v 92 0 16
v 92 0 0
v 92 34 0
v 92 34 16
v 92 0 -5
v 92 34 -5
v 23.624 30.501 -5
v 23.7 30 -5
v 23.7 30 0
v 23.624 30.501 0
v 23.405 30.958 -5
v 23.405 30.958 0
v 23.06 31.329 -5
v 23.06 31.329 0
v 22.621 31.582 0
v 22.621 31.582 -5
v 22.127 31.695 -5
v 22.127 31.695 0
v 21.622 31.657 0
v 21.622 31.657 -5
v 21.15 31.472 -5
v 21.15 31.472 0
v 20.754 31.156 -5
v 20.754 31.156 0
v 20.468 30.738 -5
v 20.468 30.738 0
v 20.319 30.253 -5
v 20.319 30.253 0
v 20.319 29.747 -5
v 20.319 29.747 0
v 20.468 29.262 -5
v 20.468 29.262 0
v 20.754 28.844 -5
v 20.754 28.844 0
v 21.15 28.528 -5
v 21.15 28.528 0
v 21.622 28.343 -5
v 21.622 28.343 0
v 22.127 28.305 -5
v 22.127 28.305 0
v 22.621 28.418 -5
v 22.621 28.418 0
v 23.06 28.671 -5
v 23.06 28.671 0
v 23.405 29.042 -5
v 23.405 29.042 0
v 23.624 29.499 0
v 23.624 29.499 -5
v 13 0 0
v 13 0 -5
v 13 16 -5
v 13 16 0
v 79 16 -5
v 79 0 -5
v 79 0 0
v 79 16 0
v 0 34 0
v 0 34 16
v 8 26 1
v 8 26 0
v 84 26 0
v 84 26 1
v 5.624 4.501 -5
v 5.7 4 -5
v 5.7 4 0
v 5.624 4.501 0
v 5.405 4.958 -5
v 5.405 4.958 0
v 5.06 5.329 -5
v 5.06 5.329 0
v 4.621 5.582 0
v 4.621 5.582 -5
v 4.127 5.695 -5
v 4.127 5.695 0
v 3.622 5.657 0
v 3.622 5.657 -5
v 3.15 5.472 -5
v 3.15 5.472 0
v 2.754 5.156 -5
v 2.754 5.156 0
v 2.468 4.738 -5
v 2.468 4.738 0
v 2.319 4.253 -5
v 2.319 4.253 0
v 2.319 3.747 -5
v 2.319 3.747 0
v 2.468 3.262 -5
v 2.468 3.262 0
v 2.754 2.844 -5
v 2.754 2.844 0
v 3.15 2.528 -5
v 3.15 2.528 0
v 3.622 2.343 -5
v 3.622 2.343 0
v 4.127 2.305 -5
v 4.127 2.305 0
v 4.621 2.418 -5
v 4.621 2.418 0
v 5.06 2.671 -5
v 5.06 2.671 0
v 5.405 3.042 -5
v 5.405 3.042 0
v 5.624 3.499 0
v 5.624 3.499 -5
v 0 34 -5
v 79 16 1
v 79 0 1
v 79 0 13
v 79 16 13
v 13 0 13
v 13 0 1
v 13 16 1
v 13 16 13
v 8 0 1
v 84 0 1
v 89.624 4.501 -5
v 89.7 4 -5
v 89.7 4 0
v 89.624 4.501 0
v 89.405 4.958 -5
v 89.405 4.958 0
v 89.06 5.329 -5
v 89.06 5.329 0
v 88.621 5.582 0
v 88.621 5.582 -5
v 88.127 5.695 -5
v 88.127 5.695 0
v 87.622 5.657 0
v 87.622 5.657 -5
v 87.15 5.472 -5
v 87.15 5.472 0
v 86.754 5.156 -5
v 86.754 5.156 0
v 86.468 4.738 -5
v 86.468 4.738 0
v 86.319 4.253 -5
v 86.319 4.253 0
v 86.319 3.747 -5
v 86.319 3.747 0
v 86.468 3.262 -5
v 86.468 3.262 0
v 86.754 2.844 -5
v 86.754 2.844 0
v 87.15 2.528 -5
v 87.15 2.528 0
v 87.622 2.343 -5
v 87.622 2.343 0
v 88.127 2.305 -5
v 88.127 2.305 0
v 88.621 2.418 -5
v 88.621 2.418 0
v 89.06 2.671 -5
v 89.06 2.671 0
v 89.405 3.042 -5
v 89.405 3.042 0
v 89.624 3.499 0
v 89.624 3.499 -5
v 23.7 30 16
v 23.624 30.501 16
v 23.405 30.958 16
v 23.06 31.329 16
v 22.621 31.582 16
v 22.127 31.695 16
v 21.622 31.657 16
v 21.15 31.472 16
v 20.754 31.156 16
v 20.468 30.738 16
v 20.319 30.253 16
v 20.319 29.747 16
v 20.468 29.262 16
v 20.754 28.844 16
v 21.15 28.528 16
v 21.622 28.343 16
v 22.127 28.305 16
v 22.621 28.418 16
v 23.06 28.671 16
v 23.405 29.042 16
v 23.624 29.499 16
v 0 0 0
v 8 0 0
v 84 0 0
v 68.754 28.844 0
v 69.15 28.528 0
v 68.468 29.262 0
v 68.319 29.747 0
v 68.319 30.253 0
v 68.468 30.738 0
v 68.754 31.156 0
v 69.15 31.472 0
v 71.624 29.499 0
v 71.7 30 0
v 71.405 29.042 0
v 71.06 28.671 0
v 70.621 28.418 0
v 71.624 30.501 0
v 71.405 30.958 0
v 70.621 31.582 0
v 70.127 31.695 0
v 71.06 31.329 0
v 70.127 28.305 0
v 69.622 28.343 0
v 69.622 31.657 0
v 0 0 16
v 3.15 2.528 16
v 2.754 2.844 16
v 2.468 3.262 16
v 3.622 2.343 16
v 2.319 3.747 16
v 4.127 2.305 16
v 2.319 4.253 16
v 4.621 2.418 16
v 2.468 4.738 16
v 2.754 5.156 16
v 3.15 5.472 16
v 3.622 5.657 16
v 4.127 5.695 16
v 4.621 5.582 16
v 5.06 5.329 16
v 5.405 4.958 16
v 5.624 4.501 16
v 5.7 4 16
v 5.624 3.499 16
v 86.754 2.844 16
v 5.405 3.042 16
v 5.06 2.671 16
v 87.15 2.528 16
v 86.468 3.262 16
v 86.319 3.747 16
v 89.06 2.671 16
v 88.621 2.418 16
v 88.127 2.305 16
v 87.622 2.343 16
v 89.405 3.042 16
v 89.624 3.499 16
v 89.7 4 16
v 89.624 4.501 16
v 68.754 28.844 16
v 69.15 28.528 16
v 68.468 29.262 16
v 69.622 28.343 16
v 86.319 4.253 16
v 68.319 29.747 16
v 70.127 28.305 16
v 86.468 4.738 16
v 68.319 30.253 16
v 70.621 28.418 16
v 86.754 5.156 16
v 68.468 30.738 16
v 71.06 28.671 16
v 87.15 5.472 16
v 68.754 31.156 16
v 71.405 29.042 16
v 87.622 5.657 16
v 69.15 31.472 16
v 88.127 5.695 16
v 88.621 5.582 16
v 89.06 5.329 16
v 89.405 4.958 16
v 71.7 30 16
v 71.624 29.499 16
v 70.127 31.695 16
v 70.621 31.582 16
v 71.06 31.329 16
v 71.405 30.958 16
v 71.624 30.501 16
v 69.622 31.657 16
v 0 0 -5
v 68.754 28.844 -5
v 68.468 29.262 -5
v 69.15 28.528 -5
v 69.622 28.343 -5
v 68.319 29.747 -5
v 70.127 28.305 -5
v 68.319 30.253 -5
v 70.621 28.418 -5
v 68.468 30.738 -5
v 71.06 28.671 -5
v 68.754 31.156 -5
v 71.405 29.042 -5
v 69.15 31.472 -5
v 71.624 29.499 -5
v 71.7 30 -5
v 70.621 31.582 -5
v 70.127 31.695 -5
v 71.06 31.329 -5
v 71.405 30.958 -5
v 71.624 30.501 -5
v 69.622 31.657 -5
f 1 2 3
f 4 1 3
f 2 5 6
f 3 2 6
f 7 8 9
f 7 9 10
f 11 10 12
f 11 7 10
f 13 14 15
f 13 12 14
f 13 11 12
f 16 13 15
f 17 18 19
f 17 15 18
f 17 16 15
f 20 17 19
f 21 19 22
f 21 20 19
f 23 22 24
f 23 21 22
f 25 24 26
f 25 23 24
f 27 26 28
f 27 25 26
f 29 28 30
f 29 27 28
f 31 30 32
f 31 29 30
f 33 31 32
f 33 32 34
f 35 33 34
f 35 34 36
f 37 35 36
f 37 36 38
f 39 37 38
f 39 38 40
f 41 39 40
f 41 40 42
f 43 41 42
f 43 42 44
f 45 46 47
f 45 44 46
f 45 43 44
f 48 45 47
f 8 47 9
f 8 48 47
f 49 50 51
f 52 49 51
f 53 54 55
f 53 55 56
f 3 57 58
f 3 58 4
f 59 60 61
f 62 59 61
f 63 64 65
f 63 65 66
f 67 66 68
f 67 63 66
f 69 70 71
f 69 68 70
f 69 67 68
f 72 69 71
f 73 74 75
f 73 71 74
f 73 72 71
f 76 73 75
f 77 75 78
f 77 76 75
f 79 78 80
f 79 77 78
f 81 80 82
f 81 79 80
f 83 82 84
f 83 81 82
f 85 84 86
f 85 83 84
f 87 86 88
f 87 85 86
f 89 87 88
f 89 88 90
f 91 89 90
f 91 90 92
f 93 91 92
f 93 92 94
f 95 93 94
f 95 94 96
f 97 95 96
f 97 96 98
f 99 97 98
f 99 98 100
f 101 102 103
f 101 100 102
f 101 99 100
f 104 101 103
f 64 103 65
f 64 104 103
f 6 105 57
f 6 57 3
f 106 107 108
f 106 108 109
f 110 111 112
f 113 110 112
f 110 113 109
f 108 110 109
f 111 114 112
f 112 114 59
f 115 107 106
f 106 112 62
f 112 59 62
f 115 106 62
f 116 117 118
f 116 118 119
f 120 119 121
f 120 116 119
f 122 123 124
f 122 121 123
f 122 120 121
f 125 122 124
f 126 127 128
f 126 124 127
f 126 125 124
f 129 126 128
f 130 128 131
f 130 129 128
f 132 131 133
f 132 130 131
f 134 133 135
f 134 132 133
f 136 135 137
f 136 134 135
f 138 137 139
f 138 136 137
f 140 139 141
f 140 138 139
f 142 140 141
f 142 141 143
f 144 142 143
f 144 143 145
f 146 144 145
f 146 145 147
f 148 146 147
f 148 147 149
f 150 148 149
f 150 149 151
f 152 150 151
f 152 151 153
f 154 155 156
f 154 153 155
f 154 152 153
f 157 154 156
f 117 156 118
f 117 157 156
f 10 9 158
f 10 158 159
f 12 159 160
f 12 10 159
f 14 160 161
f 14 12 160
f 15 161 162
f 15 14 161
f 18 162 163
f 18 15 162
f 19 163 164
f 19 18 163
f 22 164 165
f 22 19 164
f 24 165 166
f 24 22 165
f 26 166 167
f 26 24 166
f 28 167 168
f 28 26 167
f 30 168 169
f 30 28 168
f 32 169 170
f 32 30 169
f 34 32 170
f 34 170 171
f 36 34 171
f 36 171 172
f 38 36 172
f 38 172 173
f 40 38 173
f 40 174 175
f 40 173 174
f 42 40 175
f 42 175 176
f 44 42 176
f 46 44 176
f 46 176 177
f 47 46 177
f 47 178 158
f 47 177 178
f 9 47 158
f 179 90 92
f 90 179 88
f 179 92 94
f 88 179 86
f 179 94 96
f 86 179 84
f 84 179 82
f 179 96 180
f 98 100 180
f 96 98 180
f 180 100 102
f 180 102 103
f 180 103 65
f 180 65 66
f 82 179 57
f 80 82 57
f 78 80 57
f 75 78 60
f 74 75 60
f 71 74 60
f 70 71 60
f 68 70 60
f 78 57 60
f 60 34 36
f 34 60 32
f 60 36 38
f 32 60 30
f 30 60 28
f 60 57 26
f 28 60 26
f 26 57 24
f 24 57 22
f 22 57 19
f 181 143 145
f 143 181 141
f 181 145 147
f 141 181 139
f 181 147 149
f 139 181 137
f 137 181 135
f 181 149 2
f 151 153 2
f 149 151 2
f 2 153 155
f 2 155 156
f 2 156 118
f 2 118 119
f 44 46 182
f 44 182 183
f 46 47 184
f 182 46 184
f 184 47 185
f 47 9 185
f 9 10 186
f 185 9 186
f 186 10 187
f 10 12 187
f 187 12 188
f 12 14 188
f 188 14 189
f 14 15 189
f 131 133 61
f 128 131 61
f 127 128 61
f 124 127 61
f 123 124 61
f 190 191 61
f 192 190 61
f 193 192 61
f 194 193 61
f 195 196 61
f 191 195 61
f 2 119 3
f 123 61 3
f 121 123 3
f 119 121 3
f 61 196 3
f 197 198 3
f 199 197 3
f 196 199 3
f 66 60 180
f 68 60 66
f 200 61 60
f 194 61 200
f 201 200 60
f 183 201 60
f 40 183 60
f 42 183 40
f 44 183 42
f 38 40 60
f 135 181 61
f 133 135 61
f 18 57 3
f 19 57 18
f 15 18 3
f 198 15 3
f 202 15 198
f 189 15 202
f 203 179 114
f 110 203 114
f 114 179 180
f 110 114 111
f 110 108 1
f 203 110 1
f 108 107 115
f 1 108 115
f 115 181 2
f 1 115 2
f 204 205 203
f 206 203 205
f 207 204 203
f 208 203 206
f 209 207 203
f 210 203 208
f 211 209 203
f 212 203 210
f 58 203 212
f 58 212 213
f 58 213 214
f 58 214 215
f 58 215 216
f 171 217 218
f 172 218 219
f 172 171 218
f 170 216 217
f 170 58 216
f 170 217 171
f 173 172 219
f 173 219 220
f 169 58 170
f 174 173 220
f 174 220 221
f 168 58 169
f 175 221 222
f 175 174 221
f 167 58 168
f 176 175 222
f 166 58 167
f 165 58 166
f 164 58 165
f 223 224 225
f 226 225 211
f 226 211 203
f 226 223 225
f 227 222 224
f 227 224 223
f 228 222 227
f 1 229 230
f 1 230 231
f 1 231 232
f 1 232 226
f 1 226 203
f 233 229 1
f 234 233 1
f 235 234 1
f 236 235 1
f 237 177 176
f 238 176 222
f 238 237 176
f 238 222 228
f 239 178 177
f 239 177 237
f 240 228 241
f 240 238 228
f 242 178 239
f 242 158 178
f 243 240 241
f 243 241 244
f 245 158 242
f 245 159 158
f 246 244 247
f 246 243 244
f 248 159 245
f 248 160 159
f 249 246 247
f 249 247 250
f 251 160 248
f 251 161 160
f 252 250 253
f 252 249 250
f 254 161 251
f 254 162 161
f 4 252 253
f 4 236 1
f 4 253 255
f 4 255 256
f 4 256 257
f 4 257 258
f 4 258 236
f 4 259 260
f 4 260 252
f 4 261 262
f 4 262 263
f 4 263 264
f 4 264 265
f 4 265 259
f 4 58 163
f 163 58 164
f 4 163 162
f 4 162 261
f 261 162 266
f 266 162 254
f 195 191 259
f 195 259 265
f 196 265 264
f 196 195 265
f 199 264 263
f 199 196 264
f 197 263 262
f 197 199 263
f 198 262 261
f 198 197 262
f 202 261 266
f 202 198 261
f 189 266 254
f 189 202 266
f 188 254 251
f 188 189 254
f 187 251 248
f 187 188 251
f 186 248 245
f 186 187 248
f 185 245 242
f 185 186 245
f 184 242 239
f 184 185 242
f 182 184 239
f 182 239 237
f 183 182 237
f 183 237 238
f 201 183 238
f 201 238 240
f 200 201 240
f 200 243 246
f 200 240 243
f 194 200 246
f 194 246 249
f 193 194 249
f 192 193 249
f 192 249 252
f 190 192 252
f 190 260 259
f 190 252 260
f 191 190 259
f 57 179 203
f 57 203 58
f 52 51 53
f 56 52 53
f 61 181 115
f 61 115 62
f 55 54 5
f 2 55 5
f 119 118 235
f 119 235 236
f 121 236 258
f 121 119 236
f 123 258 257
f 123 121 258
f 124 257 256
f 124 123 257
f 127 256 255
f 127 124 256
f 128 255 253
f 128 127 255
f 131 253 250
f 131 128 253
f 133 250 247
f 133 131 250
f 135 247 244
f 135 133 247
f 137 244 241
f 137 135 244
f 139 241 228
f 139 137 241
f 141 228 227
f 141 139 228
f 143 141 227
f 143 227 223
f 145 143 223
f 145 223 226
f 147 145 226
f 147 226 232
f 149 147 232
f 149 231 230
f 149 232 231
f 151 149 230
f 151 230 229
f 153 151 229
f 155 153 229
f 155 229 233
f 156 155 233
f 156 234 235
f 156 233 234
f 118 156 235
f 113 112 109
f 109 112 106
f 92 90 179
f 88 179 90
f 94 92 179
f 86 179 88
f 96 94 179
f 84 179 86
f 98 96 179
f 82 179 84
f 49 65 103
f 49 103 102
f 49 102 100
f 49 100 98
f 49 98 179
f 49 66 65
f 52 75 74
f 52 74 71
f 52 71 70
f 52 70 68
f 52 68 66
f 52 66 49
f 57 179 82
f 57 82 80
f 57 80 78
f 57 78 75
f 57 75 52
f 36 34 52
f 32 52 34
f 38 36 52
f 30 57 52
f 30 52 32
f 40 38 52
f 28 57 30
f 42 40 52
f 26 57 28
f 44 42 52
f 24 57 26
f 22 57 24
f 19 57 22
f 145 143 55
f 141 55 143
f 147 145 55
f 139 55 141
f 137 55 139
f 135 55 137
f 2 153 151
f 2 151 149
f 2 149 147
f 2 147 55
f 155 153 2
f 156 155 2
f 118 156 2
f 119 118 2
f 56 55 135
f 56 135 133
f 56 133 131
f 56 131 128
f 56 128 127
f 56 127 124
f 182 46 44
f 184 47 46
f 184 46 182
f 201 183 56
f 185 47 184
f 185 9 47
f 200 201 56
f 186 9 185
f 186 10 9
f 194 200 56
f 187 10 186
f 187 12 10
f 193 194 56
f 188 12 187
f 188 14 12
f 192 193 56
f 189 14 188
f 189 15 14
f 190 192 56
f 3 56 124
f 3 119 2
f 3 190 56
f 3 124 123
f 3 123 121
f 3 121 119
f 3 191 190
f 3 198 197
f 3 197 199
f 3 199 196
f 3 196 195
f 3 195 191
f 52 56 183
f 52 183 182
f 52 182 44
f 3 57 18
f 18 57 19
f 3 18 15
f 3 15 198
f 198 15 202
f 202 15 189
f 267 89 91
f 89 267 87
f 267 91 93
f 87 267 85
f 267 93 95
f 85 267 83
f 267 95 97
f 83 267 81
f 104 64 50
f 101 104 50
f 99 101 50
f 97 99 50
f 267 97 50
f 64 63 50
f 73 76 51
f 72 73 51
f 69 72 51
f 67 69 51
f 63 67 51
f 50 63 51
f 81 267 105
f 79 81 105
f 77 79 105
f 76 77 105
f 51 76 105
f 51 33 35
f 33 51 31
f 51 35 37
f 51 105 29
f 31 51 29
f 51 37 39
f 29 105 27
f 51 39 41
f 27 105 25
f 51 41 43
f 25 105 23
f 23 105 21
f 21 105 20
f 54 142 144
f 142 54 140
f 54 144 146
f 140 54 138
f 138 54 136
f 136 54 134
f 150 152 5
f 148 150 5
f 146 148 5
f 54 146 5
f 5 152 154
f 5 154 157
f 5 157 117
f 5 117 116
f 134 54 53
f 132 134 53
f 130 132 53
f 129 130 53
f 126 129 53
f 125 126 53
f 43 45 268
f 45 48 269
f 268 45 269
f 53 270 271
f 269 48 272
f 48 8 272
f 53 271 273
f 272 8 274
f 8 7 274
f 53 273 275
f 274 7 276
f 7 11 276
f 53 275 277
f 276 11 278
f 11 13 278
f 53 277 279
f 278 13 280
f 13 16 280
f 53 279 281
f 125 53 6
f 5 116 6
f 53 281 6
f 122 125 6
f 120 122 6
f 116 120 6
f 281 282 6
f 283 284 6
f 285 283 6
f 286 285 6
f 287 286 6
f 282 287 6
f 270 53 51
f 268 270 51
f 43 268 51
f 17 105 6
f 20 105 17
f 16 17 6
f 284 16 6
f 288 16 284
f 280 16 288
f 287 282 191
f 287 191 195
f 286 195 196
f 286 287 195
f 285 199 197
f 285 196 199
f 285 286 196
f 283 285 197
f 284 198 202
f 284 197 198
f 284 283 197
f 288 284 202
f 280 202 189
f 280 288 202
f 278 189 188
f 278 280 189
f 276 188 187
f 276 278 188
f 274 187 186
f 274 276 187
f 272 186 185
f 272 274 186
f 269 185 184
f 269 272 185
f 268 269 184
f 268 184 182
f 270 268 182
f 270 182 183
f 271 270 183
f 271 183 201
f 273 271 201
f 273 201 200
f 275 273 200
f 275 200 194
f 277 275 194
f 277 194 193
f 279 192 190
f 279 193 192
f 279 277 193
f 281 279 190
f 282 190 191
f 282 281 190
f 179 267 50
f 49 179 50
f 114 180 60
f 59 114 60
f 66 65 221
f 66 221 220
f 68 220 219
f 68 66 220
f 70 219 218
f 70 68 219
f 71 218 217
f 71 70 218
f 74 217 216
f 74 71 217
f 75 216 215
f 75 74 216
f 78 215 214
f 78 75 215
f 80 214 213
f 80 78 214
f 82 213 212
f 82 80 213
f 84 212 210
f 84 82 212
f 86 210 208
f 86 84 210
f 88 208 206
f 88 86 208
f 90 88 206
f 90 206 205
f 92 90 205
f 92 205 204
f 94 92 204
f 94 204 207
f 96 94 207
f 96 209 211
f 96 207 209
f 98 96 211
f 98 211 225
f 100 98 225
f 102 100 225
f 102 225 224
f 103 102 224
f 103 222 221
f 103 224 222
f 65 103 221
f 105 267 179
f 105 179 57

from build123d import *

# Parameters (mm, degrees)
CYLINDER003_R     = 1.7
CYLINDER003_DEPTH = 25
CYLINDER002_R     = 1.7
CYLINDER002_DEPTH = 25
CYLINDER001_R     = 1.7
CYLINDER001_DEPTH = 25
CYLINDER_R        = 1.7
CYLINDER_DEPTH    = 25
BOX_W             = 76
BOX_H             = 26
BOX_DEPTH         = 10
BOX002_W          = 66
BOX002_H          = 21
BOX002_DEPTH      = 22
BOX001_W          = 92
BOX001_H          = 34
BOX001_DEPTH      = 16
CYLINDER006_R     = 1.7
CYLINDER006_DEPTH = 25
CYLINDER005_R     = 1.7
CYLINDER005_DEPTH = 25
CYLINDER007_R     = 1.7
CYLINDER007_DEPTH = 25
CYLINDER004_R     = 1.7
CYLINDER004_DEPTH = 25
BOX004_W          = 66
BOX004_H          = 21
BOX004_DEPTH      = 22
BOX003_W          = 92
BOX003_H          = 34
BOX003_DEPTH      = 5


with BuildPart() as cylinder003:
    # Cylinder003 → Cylinder003 (new body)
    with BuildSketch(Plane(origin=(70, 30, -7), x_dir=(1, 0, 0), z_dir=(0, 0, 1))):
        Circle(CYLINDER003_R)
    extrude(amount=CYLINDER003_DEPTH)


with BuildPart() as cylinder002:
    # Cylinder002 → Cylinder002 (new body)
    with BuildSketch(Plane(origin=(22, 30, -7), x_dir=(1, 0, 0), z_dir=(0, 0, 1))):
        Circle(CYLINDER002_R)
    extrude(amount=CYLINDER002_DEPTH)


with BuildPart() as cylinder001:
    # Cylinder001 → Cylinder001 (new body)
    with BuildSketch(Plane(origin=(88, 4, -7), x_dir=(1, 0, 0), z_dir=(0, 0, 1))):
        Circle(CYLINDER001_R)
    extrude(amount=CYLINDER001_DEPTH)


with BuildPart() as fusion:
    # Cylinder → Cylinder (new body)
    with BuildSketch(Plane(origin=(4, 4, -7), x_dir=(1, 0, 0), z_dir=(0, 0, 1))):
        Circle(CYLINDER_R)
    extrude(amount=CYLINDER_DEPTH)

    # Fusion: union Cylinder003, Cylinder002, Cylinder001
    add(cylinder003.part)
    add(cylinder002.part)
    add(cylinder001.part)


with BuildPart() as cube:
    # Box → Box (new body)
    with BuildSketch(Plane.XY.offset(-9)):
        with Locations((38, 13)):
            Rectangle(BOX_W, BOX_H)
    extrude(amount=BOX_DEPTH)


with BuildPart() as cube002:
    # Box002 → Box002 (new body)
    with BuildSketch(Plane(origin=(5, -5, -9), x_dir=(1, 0, 0), z_dir=(0, 0, 1))):
        with Locations((33, 10.5)):
            Rectangle(BOX002_W, BOX002_H)
    extrude(amount=BOX002_DEPTH)


with BuildPart() as cut003:
    # Box001 → Box001 (new body)
    with BuildSketch(Plane(origin=(-8, 0, 0), x_dir=(1, 0, 0), z_dir=(0, 0, 1))):
        with Locations((46, 17)):
            Rectangle(BOX001_W, BOX001_H)
    extrude(amount=BOX001_DEPTH)

    # Cut: cut Cube002
    add(cube002.part, mode=Mode.SUBTRACT)

    # Cut001: cut Cube
    add(cube.part, mode=Mode.SUBTRACT)


with BuildPart() as cut003_1:
    # Cut001 placement: moved
    add(cut003.part.moved(Location((8, 0, 0))))

    # Cut003: cut Fusion
    add(fusion.part, mode=Mode.SUBTRACT)


with BuildPart() as cylinder006:
    # Cylinder006 → Cylinder006 (new body)
    with BuildSketch(Plane(origin=(22, 30, -7), x_dir=(1, 0, 0), z_dir=(0, 0, 1))):
        Circle(CYLINDER006_R)
    extrude(amount=CYLINDER006_DEPTH)


with BuildPart() as cylinder005:
    # Cylinder005 → Cylinder005 (new body)
    with BuildSketch(Plane(origin=(70, 30, -7), x_dir=(1, 0, 0), z_dir=(0, 0, 1))):
        Circle(CYLINDER005_R)
    extrude(amount=CYLINDER005_DEPTH)


with BuildPart() as cylinder007:
    # Cylinder007 → Cylinder007 (new body)
    with BuildSketch(Plane(origin=(88, 4, -7), x_dir=(1, 0, 0), z_dir=(0, 0, 1))):
        Circle(CYLINDER007_R)
    extrude(amount=CYLINDER007_DEPTH)


with BuildPart() as fusion001:
    # Cylinder004 → Cylinder004 (new body)
    with BuildSketch(Plane(origin=(4, 4, -7), x_dir=(1, 0, 0), z_dir=(0, 0, 1))):
        Circle(CYLINDER004_R)
    extrude(amount=CYLINDER004_DEPTH)

    # Fusion001: union Cylinder006, Cylinder005, Cylinder007
    add(cylinder006.part)
    add(cylinder005.part)
    add(cylinder007.part)


with BuildPart() as cube004:
    # Box004 → Box004 (new body)
    with BuildSketch(Plane(origin=(5, -5, -9), x_dir=(1, 0, 0), z_dir=(0, 0, 1))):
        with Locations((33, 10.5)):
            Rectangle(BOX004_W, BOX004_H)
    extrude(amount=BOX004_DEPTH)


with BuildPart() as cut004:
    # Box003 → Box003 (new body)
    with BuildSketch(Plane(origin=(-8, 0, -5), x_dir=(1, 0, 0), z_dir=(0, 0, 1))):
        with Locations((46, 17)):
            Rectangle(BOX003_W, BOX003_H)
    extrude(amount=BOX003_DEPTH)

    # Cut002: cut Cube004
    add(cube004.part, mode=Mode.SUBTRACT)


with BuildPart() as cut004_1:
    # Cut002 placement: moved
    add(cut004.part.moved(Location((8, 0, 0))))

    # Cut004: cut Fusion001
    add(fusion001.part, mode=Mode.SUBTRACT)


solid = Compound([cut003_1.part, cut004_1.part])
